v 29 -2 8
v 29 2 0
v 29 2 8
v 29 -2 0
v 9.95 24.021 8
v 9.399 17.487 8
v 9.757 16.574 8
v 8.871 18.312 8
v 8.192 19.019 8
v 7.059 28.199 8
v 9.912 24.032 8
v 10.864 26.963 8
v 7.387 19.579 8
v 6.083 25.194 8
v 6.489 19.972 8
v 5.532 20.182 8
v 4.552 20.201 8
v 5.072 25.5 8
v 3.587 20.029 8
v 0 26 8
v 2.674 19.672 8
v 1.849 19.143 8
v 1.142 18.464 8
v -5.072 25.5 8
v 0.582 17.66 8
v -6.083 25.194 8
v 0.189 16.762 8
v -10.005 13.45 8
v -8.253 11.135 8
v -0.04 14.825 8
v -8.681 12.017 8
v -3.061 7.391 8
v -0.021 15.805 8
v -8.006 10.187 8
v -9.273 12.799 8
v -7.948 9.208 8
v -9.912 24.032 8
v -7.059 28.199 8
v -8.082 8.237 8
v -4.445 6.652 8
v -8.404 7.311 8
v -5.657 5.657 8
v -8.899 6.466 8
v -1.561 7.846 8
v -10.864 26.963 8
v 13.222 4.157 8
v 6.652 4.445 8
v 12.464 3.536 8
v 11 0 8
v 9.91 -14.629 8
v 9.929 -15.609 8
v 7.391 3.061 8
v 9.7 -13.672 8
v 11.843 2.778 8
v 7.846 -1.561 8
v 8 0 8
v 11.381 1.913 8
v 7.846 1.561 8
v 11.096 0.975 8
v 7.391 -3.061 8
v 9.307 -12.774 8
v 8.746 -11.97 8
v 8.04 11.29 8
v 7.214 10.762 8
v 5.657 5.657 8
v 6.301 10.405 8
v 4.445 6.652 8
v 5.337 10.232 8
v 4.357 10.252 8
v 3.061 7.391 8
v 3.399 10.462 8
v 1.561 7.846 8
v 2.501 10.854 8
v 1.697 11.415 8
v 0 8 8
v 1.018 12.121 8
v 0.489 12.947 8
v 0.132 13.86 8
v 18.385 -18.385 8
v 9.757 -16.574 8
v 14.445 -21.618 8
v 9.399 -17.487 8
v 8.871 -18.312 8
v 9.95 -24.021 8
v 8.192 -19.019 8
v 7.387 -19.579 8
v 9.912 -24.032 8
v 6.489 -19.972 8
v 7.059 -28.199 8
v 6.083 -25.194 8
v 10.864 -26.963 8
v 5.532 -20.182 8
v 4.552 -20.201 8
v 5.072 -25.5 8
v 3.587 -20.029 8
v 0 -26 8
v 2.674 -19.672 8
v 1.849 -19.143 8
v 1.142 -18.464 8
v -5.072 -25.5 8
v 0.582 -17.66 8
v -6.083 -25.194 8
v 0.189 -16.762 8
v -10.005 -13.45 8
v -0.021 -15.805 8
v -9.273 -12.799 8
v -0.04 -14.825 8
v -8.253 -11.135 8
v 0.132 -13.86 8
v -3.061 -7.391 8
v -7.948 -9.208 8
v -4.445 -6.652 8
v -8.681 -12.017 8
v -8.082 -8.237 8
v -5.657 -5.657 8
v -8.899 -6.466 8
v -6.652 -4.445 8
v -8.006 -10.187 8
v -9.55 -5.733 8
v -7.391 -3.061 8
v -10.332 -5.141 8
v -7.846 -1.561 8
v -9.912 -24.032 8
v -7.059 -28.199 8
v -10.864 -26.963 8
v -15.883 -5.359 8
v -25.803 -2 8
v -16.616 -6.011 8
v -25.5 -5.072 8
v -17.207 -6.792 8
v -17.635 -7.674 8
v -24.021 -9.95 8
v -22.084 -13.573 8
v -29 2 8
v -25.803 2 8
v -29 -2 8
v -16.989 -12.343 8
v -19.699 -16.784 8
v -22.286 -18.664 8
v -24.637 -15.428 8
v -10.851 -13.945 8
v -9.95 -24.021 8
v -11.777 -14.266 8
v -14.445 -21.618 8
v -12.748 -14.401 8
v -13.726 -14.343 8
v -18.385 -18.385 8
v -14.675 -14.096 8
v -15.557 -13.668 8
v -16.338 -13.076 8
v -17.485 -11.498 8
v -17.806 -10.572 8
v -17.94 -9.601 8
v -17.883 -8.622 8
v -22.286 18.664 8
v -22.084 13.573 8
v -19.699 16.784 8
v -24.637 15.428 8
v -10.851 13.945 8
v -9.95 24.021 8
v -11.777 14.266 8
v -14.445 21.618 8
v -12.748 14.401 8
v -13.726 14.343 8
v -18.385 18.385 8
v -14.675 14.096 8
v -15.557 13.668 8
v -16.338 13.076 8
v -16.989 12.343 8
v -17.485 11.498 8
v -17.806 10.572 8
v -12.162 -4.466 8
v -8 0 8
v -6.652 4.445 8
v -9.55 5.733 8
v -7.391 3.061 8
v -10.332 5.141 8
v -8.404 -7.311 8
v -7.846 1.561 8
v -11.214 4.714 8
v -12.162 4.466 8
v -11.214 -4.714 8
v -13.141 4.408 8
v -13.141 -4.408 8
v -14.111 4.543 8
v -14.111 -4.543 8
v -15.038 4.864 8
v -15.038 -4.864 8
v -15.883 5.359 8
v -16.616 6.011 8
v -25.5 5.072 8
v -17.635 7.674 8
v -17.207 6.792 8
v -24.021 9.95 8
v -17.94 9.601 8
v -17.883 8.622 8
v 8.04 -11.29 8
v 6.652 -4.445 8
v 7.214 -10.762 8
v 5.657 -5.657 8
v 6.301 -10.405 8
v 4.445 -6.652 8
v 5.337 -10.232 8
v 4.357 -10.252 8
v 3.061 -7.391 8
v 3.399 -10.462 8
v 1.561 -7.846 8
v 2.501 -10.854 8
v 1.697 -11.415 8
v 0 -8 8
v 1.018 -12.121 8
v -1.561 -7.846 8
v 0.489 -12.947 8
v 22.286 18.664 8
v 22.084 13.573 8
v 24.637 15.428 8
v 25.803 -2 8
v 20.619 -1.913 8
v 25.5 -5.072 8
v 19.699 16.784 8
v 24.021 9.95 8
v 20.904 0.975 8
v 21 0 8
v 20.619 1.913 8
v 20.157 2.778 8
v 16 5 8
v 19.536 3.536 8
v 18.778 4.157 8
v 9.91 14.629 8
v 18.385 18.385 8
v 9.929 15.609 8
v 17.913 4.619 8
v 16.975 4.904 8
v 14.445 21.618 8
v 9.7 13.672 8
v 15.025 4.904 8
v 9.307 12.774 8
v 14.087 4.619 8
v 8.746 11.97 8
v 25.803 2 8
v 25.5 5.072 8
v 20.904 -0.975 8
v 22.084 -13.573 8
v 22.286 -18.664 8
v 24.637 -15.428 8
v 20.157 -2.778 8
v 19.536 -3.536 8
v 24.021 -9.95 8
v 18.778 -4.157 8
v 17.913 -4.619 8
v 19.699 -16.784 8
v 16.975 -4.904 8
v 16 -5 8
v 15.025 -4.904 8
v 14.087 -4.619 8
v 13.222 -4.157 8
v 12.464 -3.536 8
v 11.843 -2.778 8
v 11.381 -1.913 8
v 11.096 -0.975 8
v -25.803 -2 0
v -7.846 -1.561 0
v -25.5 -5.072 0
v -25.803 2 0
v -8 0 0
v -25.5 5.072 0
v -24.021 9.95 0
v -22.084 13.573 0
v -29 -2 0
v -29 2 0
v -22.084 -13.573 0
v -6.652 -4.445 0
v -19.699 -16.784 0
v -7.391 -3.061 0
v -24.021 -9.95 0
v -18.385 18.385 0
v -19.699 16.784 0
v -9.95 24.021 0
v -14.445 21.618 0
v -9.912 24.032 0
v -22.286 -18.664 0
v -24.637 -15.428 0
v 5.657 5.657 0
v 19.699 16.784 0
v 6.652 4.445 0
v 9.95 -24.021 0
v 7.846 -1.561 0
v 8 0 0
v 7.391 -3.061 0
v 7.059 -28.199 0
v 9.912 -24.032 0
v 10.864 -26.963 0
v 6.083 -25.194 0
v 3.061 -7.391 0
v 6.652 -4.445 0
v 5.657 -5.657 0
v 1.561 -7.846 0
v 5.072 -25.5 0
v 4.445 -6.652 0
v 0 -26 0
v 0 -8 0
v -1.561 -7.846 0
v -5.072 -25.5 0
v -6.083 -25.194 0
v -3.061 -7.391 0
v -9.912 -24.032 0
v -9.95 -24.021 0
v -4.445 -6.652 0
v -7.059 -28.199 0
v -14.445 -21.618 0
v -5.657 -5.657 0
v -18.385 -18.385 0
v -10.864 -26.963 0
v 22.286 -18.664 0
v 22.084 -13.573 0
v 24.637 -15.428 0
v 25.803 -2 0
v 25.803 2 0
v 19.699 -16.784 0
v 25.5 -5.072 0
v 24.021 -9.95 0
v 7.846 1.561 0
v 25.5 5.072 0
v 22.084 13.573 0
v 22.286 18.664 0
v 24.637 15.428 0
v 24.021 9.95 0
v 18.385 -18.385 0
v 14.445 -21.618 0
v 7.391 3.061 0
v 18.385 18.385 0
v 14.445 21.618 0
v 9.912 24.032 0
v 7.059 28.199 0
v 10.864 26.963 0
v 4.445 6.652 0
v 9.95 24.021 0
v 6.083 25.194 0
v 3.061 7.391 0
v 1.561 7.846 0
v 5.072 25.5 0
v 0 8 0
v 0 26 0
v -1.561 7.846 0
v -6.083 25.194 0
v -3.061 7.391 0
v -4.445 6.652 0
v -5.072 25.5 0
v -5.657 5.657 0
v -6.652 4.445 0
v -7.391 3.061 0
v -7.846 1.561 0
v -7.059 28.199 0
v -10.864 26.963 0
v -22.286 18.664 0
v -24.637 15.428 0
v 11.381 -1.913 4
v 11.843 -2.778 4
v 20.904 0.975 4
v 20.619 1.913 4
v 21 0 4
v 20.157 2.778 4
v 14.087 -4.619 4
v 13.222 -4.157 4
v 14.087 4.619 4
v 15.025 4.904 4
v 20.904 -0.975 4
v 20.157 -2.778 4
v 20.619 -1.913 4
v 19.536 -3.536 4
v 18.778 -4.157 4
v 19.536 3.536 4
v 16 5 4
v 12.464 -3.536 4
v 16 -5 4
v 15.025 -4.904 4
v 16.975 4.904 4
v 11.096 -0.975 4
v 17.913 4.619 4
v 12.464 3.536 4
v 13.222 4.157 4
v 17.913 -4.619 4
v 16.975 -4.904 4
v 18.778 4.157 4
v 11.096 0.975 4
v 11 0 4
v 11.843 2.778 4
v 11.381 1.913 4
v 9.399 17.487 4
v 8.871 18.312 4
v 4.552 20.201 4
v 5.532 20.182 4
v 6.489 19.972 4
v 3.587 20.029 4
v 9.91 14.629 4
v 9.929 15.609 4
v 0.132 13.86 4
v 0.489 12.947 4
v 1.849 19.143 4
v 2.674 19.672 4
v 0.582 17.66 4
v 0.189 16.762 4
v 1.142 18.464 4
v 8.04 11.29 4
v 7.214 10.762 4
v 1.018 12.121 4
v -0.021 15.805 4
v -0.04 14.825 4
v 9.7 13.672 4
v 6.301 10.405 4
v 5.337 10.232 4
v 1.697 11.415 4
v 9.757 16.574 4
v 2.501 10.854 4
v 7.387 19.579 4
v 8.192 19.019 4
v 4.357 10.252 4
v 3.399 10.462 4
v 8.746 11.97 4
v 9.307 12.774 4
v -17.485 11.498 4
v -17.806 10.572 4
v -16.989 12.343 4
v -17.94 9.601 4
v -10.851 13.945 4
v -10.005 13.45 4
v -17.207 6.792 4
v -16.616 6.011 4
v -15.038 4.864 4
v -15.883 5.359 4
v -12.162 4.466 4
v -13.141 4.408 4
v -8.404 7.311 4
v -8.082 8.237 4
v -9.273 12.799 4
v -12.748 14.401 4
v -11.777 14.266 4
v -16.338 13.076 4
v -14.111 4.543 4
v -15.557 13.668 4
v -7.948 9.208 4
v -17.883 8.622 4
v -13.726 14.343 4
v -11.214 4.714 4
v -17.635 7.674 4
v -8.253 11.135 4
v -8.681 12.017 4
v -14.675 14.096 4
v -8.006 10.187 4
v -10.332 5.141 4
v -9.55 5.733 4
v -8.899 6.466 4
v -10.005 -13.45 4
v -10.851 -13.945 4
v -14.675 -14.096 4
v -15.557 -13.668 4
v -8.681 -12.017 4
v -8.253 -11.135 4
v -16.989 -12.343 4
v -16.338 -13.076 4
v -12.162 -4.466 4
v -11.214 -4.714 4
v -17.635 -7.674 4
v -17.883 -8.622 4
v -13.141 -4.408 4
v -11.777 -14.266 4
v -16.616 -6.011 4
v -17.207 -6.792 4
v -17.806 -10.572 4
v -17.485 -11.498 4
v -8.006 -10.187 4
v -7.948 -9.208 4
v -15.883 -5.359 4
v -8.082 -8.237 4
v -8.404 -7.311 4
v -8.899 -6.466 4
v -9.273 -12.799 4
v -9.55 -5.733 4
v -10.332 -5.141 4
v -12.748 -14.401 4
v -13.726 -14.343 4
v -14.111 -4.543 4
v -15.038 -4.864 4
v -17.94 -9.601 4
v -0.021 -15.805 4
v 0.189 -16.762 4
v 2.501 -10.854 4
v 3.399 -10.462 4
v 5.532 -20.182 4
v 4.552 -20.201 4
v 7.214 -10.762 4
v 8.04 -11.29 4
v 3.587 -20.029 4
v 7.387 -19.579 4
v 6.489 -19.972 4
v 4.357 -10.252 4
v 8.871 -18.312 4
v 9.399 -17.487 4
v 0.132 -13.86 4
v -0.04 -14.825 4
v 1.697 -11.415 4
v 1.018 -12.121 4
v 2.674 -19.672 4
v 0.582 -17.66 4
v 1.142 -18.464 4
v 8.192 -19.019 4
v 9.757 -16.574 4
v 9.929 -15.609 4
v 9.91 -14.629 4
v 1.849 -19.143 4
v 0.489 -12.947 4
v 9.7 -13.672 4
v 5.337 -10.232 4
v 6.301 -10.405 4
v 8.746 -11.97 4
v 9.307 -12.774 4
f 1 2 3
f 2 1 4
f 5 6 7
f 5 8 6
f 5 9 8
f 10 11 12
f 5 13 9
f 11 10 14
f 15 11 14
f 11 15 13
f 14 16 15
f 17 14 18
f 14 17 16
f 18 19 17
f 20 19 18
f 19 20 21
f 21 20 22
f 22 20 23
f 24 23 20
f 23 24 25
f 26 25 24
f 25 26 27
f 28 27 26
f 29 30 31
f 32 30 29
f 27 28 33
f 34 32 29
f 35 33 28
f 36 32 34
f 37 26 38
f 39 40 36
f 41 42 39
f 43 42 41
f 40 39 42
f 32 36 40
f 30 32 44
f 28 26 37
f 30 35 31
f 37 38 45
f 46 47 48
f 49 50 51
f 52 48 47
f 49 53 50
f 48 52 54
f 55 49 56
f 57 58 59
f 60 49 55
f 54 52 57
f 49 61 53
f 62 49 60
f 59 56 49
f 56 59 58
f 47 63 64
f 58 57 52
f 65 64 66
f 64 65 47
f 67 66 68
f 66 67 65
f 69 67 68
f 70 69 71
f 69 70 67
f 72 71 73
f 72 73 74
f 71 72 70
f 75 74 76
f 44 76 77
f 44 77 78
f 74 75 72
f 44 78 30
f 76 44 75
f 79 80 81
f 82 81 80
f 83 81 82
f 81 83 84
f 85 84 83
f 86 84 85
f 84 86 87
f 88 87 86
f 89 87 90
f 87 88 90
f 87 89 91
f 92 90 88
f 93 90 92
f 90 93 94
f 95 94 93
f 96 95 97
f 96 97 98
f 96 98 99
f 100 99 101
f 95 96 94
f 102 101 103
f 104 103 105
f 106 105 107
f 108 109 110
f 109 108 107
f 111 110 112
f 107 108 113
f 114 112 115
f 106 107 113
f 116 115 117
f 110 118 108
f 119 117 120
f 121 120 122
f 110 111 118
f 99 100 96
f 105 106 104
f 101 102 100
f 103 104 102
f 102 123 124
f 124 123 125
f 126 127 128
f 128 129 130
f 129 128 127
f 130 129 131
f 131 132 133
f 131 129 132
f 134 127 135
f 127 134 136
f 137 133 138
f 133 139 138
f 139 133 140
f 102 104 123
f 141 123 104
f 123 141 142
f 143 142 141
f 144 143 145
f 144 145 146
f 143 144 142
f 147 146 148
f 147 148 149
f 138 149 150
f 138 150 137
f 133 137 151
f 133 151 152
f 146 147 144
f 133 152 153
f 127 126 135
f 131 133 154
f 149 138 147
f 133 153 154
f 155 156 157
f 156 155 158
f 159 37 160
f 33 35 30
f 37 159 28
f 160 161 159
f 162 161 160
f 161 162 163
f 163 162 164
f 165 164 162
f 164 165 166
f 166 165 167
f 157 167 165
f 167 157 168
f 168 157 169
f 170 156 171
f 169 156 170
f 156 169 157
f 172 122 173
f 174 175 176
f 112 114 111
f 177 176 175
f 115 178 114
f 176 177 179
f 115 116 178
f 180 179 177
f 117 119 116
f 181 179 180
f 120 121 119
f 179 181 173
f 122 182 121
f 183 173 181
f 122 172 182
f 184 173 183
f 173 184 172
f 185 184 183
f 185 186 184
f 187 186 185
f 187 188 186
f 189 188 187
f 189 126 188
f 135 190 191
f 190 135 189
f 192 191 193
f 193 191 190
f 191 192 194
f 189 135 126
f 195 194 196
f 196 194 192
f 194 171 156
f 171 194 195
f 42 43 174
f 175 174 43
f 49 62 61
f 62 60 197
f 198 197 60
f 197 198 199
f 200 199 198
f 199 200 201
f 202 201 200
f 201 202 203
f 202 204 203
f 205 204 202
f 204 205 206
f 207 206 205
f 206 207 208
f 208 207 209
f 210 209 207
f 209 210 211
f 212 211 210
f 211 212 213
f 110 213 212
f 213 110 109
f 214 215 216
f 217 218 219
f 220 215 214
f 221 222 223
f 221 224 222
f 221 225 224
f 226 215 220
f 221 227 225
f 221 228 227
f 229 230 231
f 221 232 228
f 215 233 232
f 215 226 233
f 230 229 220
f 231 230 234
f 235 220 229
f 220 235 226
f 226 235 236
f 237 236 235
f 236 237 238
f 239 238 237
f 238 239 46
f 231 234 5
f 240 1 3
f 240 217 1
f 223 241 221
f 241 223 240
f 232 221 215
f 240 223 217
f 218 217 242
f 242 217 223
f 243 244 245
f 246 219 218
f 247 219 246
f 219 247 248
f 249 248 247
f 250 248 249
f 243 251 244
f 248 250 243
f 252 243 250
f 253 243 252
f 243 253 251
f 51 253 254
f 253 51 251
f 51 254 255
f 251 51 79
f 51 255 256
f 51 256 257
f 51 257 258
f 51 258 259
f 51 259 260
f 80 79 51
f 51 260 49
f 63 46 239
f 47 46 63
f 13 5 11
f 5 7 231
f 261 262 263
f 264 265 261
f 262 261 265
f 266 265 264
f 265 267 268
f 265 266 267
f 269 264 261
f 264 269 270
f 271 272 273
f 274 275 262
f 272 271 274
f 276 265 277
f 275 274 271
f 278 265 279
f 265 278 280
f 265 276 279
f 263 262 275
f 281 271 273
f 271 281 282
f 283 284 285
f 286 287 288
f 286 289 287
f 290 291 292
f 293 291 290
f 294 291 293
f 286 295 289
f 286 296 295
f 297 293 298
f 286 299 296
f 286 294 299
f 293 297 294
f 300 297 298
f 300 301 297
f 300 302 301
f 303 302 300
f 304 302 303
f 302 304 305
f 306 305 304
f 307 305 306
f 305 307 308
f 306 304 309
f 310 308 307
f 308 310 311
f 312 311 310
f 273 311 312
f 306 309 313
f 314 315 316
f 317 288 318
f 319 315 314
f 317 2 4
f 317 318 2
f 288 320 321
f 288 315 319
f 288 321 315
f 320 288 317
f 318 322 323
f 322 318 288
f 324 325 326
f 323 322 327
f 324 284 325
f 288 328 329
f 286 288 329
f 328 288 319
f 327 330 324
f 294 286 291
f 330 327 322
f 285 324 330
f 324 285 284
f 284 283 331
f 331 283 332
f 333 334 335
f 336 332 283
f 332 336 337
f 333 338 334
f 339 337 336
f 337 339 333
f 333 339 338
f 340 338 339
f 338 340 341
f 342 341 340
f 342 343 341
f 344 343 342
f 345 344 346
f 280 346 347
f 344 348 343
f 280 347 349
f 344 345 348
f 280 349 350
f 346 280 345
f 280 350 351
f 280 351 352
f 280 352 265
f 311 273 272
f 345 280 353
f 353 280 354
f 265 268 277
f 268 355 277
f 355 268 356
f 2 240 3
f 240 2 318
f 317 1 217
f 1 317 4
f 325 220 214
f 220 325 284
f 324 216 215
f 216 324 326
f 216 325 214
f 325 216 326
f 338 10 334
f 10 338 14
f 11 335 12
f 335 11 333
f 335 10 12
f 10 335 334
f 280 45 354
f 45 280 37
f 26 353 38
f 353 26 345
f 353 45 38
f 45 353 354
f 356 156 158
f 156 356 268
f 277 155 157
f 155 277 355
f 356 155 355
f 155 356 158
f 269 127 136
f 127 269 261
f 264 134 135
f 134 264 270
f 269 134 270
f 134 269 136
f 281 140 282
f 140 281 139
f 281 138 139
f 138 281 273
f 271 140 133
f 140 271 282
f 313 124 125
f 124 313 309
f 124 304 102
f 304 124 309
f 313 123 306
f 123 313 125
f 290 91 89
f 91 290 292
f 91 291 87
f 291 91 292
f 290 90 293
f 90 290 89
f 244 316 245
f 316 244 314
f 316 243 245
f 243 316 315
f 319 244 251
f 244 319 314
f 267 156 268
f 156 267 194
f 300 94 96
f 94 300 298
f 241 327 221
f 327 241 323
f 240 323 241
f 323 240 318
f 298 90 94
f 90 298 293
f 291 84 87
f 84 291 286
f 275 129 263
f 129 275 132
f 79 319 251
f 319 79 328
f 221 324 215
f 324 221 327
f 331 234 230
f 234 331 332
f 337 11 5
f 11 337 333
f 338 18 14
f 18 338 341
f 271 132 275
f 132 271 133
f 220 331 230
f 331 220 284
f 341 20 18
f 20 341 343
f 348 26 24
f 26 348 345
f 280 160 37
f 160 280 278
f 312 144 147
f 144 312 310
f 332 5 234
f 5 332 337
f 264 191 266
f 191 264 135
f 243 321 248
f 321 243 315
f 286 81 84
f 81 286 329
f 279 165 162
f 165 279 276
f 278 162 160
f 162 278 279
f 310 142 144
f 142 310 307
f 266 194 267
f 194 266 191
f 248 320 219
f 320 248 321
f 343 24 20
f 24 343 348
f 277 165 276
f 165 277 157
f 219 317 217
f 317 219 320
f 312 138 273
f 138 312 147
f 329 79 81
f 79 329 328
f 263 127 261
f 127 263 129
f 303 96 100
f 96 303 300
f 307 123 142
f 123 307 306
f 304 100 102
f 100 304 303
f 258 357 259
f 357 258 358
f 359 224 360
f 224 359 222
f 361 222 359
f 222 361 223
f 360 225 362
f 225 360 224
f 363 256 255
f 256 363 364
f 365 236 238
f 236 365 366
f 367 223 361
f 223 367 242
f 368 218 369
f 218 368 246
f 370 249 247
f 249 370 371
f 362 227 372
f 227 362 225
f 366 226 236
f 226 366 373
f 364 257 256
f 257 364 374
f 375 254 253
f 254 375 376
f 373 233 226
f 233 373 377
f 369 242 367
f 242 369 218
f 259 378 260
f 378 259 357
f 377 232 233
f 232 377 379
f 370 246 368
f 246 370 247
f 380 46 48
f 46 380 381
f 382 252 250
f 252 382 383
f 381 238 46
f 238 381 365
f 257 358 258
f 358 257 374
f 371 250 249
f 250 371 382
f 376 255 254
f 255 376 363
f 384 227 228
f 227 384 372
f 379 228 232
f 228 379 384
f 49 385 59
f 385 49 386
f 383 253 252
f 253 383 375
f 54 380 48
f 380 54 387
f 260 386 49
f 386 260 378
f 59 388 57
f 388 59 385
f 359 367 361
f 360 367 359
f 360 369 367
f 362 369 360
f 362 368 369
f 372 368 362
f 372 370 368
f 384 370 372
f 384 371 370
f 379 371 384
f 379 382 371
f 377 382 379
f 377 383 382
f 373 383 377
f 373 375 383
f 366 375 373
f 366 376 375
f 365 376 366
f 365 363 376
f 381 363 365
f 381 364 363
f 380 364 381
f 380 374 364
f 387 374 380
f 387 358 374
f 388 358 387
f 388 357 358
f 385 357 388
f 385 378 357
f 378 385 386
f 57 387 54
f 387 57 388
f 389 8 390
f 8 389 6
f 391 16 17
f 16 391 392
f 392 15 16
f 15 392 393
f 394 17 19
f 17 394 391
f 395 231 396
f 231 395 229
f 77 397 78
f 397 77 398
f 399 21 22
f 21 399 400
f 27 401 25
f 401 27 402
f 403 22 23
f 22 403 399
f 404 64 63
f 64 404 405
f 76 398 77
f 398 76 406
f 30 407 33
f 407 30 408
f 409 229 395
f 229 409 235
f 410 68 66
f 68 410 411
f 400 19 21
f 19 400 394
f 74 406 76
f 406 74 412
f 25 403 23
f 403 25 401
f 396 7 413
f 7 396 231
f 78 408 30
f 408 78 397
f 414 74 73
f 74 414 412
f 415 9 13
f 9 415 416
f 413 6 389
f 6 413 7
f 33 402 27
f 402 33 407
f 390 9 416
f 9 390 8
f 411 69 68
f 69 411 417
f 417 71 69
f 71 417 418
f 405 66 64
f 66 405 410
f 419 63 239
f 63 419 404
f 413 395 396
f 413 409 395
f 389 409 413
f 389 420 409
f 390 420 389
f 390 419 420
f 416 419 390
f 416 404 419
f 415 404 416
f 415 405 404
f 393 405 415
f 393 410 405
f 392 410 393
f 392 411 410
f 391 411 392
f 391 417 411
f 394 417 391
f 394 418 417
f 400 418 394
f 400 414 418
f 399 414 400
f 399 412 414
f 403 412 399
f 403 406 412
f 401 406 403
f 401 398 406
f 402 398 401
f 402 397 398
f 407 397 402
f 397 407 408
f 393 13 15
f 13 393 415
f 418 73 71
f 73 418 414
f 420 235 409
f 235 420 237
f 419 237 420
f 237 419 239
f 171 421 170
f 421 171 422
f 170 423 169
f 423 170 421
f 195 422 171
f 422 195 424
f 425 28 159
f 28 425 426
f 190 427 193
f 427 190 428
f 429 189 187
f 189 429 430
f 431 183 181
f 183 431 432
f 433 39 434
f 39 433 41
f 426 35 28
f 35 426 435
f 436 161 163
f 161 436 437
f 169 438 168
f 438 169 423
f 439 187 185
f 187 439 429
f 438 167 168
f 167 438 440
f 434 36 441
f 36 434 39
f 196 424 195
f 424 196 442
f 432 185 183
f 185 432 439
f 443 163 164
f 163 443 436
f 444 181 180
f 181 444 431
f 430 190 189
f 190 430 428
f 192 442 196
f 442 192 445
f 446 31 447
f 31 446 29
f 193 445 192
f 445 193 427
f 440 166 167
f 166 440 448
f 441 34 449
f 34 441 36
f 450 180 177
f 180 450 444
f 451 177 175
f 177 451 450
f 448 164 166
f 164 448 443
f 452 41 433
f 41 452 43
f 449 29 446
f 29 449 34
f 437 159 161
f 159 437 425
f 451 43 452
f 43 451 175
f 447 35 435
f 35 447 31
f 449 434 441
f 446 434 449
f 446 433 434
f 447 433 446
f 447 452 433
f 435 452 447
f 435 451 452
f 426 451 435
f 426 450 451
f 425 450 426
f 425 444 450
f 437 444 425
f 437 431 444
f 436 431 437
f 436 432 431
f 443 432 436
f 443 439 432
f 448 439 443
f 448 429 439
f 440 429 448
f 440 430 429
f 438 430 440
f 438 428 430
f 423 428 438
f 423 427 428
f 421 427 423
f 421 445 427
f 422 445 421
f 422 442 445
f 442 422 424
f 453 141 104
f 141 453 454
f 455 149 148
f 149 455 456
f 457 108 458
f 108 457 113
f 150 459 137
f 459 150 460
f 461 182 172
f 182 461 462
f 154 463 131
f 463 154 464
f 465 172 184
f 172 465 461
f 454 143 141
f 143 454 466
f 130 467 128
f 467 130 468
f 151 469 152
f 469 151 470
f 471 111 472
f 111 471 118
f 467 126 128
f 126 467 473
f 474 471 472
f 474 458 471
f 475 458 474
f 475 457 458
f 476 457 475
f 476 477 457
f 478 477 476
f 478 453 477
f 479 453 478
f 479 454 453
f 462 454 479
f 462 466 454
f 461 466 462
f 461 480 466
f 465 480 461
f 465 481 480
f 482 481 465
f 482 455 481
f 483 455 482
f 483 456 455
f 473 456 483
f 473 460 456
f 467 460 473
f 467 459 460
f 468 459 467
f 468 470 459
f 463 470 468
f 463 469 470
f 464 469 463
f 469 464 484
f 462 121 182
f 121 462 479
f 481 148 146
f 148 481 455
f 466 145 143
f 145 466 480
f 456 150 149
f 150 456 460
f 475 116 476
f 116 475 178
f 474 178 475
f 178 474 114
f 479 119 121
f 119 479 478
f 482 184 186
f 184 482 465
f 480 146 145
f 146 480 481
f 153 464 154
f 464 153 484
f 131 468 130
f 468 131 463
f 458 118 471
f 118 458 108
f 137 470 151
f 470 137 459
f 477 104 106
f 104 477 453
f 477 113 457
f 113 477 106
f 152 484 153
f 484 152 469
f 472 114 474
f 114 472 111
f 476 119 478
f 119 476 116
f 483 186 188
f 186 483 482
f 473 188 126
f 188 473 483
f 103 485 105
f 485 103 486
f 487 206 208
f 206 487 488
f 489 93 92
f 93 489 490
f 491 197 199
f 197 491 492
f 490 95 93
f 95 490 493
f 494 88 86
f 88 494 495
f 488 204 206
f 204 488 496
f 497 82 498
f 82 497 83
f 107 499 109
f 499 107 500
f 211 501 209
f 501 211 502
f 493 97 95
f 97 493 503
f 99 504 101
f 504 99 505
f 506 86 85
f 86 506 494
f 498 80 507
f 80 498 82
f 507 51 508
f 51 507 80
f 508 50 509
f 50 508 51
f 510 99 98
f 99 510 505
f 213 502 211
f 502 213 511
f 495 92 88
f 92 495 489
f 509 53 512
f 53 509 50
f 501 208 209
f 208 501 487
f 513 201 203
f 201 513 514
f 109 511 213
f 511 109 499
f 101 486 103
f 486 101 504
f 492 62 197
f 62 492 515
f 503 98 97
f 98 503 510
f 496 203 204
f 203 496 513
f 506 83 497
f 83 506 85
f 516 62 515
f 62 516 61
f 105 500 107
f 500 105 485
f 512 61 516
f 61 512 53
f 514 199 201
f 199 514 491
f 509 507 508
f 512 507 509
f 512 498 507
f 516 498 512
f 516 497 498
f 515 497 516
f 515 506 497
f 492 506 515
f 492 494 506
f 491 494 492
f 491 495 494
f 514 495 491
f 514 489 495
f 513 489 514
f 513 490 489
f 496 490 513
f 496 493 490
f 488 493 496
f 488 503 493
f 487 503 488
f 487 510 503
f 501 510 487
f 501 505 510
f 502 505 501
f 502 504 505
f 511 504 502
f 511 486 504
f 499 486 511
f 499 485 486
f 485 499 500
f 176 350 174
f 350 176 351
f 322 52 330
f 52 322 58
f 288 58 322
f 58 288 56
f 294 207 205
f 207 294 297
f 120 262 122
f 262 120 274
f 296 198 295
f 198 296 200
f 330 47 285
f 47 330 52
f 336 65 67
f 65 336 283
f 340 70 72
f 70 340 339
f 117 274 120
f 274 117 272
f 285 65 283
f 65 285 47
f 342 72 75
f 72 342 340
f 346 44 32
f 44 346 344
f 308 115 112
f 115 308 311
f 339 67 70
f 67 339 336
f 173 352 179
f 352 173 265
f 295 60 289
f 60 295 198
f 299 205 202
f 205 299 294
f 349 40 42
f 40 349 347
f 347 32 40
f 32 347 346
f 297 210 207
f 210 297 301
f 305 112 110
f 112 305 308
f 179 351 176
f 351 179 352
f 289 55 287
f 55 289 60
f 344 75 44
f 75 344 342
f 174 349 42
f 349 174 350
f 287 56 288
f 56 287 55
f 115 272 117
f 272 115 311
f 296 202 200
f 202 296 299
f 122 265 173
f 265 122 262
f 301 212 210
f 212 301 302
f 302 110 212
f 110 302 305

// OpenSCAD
$fn = 32;

// ----------------------------------------------------------------------
// Spur blank: lightened gear blank
// ----------------------------------------------------------------------

// --- parameters (mm) ---
disc_r = 26;              // blank root radius
disc_t = 8;               // blank thickness
n_teeth = 10;             // stub tooth count
tooth_w = 4;              // tooth width at the root
tooth_h = 3;              // tooth height above the root
bore_r = 8;               // central bore radius
ring_r = 16;              // lightening pocket ring radius
pocket_r = 5;             // lightening pocket radius

out_r = disc_r + tooth_h;  // tip radius
bbox_x = 58.0;  // measured width over the teeth
bbox_y = 56.4;  // measured depth over the teeth

difference() {
union() {
  cylinder(r = disc_r, h = disc_t);
  for (i = [0 : n_teeth - 1])
    rotate([0, 0, i * 360 / n_teeth])
      translate([disc_r - 1, -tooth_w / 2, 0])
        cube([tooth_h + 1, tooth_w, disc_t]);
}
  translate([0, 0, -1]) cylinder(r = bore_r, h = disc_t + 2);
  for (i = [0 : 5])
    rotate([0, 0, i * 72])
      translate([ring_r, 0, disc_t - 4])
        cylinder(r = pocket_r, h = 5);
}
